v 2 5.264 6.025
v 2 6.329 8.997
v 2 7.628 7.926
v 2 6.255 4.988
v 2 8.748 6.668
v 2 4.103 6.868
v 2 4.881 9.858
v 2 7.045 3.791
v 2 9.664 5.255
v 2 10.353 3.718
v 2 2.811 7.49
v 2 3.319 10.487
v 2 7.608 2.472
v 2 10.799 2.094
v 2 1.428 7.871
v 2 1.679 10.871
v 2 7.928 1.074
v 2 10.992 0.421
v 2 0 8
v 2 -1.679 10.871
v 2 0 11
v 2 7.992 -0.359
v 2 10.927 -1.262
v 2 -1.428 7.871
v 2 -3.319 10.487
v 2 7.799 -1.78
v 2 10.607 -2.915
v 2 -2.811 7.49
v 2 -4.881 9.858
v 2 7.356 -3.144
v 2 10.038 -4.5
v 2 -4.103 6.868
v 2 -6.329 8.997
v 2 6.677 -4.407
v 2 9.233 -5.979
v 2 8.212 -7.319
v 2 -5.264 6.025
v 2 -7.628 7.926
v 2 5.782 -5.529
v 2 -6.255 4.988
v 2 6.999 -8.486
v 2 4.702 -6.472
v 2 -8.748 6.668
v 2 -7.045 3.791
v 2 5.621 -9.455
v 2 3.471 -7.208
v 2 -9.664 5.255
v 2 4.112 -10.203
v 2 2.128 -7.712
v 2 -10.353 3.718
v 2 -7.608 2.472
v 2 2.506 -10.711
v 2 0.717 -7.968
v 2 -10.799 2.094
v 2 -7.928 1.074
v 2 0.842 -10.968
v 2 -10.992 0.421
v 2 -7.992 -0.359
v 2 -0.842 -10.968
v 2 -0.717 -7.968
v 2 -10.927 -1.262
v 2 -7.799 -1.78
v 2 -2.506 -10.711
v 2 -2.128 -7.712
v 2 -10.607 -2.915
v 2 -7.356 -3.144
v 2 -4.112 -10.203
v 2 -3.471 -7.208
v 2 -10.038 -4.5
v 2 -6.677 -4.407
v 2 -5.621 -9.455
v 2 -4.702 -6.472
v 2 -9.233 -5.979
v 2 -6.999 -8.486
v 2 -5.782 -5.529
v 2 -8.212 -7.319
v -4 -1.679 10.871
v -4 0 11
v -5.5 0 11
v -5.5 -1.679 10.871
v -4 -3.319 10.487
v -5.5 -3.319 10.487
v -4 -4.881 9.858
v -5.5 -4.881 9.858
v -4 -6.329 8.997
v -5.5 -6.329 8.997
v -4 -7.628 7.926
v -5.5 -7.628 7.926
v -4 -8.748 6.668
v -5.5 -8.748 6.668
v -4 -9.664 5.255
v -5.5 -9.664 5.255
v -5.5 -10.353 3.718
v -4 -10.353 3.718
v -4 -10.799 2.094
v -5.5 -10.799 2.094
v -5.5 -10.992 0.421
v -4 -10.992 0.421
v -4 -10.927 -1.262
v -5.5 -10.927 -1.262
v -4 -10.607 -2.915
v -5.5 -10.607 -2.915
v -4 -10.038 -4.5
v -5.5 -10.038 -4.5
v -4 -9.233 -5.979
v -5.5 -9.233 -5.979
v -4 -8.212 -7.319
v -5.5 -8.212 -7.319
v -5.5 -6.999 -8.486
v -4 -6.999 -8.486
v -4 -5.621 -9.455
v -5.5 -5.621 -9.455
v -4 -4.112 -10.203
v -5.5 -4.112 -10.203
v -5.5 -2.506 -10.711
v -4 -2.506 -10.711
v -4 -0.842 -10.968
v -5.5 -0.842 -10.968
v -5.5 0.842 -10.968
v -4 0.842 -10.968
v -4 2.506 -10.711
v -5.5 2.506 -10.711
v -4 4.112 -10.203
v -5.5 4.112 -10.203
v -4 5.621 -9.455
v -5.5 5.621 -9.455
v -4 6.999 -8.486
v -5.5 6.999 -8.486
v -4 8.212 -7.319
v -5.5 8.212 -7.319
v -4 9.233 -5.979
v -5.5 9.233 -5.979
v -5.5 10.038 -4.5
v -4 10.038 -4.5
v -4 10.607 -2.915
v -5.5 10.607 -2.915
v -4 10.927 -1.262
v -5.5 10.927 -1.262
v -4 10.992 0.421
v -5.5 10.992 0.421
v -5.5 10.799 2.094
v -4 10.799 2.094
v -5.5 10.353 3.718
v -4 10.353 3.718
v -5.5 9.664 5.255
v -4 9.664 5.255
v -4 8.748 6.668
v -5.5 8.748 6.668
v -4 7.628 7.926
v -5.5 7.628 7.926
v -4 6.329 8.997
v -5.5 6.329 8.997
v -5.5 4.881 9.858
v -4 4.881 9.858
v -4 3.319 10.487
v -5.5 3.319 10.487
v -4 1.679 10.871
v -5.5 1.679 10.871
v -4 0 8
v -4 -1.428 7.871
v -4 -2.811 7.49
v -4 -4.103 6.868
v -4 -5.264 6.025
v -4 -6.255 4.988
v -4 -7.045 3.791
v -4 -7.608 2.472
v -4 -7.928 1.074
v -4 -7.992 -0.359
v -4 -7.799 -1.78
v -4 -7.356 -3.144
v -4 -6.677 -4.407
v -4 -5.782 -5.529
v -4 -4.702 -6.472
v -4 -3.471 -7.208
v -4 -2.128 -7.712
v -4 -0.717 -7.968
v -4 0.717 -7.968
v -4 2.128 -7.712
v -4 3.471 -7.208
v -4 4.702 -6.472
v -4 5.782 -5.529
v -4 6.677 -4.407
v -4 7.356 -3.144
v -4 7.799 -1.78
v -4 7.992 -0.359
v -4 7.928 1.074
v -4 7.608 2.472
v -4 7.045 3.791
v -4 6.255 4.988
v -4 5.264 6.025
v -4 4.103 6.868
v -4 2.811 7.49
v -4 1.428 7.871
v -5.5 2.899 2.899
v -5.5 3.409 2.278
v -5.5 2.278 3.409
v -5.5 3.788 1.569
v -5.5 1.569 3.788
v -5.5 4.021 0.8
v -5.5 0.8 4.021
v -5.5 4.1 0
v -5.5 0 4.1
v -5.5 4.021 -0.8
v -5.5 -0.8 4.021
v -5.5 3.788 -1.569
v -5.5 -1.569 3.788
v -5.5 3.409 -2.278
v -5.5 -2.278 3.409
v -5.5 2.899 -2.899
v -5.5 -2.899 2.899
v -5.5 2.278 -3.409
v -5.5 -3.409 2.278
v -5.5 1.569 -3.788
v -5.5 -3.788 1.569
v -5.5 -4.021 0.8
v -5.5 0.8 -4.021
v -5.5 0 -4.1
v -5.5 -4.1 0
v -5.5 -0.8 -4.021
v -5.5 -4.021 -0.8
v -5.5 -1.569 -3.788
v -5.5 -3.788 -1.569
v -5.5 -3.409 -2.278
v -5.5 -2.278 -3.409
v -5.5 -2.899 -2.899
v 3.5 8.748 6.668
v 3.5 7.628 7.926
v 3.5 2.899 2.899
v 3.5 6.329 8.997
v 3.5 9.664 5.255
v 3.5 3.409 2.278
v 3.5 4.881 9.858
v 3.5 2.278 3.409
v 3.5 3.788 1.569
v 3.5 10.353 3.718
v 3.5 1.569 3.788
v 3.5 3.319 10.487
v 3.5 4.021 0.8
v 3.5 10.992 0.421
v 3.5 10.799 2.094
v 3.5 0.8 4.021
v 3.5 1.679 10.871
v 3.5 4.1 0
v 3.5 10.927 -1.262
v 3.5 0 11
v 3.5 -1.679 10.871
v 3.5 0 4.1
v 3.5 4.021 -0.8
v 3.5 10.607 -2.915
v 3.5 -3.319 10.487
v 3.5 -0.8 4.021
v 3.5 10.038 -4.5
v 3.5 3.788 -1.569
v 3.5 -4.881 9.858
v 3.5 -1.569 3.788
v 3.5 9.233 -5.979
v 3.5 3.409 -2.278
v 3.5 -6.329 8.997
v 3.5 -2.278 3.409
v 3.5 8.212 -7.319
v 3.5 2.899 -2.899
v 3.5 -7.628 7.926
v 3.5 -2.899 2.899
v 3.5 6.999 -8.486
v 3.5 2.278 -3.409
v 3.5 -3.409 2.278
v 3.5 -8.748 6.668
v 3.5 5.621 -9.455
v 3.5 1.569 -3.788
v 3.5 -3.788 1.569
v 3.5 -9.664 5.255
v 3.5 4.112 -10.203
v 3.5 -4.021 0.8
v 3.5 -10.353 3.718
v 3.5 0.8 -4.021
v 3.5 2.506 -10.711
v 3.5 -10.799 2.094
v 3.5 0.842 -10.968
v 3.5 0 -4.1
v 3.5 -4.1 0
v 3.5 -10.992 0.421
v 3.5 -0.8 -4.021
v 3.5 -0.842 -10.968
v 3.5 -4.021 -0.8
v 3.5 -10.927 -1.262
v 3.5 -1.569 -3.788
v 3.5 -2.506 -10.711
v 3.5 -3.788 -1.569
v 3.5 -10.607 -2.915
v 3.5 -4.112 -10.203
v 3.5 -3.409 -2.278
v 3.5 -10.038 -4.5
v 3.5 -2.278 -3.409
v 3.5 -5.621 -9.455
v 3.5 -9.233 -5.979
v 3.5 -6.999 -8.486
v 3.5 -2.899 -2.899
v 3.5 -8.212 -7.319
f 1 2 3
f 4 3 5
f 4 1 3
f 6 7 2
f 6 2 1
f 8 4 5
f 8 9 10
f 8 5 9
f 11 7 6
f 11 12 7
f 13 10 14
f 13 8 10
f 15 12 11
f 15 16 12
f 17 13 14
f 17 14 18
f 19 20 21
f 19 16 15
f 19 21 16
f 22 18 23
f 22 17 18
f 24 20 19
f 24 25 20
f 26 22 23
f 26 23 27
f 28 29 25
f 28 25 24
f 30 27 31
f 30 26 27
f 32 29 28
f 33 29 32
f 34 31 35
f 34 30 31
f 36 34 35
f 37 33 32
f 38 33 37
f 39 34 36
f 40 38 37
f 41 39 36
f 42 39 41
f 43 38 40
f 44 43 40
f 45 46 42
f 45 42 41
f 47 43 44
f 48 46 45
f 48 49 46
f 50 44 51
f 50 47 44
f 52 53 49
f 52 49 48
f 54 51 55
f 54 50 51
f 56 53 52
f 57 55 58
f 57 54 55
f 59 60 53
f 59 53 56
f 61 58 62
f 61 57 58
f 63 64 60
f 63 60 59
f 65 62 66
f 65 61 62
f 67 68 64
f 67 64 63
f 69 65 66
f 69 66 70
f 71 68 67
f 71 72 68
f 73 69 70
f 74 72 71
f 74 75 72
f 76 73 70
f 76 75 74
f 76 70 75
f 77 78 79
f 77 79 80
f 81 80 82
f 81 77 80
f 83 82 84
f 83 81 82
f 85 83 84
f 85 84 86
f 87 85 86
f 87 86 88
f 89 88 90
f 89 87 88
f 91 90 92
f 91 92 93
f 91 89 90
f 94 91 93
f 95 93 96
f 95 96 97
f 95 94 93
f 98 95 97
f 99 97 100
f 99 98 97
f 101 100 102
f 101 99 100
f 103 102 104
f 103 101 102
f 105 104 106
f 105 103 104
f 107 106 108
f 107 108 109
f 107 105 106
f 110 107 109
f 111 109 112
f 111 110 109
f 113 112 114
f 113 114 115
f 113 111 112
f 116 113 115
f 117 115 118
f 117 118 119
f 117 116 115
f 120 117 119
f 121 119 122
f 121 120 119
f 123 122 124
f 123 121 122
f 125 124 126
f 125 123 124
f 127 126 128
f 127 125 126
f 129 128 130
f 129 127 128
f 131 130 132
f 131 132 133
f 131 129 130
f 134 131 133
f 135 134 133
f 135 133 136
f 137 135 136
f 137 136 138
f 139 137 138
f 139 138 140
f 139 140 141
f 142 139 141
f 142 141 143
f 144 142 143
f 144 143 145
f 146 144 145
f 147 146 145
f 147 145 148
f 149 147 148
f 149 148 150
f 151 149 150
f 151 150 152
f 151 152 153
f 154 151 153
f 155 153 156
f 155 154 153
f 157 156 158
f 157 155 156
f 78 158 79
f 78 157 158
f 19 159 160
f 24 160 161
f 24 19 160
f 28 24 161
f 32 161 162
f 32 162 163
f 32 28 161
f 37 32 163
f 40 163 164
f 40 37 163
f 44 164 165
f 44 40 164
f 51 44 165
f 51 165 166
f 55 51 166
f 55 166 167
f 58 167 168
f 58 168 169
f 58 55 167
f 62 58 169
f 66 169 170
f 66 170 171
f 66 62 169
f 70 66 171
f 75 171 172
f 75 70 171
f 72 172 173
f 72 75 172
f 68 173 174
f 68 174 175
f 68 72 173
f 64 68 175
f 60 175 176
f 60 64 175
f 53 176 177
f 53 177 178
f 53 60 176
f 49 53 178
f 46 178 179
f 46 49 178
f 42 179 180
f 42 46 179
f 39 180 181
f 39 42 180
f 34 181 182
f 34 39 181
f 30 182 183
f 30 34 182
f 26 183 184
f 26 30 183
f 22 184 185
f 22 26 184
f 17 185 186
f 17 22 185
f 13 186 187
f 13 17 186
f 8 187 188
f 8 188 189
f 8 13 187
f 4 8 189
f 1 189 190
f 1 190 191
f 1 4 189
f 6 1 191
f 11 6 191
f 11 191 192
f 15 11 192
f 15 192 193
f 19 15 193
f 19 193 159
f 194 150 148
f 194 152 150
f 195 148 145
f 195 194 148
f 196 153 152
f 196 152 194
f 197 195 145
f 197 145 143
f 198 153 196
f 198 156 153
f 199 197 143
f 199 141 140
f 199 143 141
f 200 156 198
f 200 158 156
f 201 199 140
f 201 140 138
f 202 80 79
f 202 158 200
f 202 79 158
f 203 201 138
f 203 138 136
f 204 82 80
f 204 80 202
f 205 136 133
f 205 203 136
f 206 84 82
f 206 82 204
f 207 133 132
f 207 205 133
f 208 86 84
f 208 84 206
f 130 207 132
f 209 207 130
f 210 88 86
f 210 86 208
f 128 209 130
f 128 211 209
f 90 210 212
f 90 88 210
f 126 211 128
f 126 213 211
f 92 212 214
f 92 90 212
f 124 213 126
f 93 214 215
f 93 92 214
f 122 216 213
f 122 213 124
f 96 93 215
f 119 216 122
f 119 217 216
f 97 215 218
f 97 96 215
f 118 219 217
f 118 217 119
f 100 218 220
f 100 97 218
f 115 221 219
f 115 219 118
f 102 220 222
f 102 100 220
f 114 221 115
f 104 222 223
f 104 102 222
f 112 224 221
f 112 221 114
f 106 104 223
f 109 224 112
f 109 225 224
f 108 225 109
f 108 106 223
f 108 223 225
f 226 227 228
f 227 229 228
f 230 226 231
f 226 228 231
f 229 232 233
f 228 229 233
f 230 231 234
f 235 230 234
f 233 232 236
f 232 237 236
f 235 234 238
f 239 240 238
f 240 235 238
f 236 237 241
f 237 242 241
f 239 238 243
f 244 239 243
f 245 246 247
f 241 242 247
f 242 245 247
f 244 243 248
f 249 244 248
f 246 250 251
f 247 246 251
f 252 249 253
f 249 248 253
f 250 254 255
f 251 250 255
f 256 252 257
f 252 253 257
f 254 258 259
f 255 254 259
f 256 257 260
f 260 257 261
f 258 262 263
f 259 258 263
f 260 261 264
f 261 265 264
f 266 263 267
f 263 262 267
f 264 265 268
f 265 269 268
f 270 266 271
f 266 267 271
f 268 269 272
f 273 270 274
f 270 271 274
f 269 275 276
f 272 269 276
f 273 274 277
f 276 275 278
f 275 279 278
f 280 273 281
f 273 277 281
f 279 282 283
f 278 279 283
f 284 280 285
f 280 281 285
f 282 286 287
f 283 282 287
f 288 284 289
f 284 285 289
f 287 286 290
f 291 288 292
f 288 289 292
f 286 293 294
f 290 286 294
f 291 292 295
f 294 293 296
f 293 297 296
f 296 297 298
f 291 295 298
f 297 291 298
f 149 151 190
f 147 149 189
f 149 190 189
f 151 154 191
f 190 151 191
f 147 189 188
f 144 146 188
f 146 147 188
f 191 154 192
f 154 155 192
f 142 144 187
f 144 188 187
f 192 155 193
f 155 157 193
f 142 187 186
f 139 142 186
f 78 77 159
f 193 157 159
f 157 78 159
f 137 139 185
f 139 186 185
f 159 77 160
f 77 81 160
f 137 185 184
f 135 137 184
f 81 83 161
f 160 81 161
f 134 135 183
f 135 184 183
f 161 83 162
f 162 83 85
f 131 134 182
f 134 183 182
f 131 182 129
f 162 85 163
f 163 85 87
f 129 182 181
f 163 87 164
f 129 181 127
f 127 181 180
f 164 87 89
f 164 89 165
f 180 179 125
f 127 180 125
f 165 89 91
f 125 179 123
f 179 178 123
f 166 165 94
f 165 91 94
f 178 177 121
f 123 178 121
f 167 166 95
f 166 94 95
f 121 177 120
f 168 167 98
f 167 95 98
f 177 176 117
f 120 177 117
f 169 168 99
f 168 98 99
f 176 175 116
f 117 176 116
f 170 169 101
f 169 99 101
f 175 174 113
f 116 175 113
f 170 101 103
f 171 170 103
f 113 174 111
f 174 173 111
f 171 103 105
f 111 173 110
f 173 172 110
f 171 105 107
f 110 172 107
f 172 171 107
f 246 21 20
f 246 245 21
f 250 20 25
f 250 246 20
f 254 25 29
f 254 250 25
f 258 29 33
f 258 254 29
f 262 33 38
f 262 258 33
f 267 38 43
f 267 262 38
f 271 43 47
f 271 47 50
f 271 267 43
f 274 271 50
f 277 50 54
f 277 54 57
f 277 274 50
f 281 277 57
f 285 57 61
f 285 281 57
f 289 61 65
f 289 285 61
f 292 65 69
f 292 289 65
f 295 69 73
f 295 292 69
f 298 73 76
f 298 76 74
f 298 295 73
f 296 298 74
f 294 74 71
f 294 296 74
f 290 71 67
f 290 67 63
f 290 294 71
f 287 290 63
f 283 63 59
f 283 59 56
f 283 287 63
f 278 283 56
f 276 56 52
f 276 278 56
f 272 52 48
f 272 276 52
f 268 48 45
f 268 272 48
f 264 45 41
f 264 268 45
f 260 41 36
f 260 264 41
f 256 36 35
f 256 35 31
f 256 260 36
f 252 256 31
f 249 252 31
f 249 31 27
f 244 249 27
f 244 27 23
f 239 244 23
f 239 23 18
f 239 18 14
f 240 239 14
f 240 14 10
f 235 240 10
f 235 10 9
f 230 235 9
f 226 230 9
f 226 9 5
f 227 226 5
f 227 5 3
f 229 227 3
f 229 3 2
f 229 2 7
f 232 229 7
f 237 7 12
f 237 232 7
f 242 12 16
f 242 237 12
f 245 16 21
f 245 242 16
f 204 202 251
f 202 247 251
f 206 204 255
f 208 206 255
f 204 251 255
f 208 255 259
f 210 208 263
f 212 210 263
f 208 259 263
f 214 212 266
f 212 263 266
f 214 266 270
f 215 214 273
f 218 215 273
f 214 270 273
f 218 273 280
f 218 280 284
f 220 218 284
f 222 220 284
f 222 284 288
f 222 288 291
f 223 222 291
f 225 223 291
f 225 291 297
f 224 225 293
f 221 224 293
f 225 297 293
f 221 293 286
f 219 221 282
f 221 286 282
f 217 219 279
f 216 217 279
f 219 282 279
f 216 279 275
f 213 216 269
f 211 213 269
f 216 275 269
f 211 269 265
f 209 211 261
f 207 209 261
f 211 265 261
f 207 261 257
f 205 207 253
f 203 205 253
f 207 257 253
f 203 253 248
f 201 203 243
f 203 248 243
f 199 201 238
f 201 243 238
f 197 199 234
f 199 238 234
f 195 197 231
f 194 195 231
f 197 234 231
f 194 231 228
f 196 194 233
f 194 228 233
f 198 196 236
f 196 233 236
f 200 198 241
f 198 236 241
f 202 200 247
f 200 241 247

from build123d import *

# Parameters (mm, degrees)
SKETCH1_W = 9
SKETCH1_H = 6.9
SKETCH2_W = 6
SKETCH2_H = 3


with BuildPart() as part:
    # Sketch1 → Revolve1 (revolve)
    with BuildSketch(Plane.XY, mode=Mode.PRIVATE) as revolve1_sk:
        with Locations((-1, 7.55)):
            Rectangle(SKETCH1_W, SKETCH1_H)
    revolve(revolve1_sk.sketch.rotate(Axis((0, 0, 0), (1, 0, 0)), 90), axis=Axis((0, 0, 0), (1, 0, 0)))

    # Sketch2 → Cut-Revolve1 (revolve, cut)
    with BuildSketch(Plane.XY, mode=Mode.PRIVATE) as cut_revolve1_sk:
        with Locations((-1, 9.5)):
            Rectangle(SKETCH2_W, SKETCH2_H)
    revolve(cut_revolve1_sk.sketch.rotate(Axis((0, 0, 0), (1, 0, 0)), 90), axis=Axis((0, 0, 0), (1, 0, 0)), mode=Mode.SUBTRACT)


solid = part.part
